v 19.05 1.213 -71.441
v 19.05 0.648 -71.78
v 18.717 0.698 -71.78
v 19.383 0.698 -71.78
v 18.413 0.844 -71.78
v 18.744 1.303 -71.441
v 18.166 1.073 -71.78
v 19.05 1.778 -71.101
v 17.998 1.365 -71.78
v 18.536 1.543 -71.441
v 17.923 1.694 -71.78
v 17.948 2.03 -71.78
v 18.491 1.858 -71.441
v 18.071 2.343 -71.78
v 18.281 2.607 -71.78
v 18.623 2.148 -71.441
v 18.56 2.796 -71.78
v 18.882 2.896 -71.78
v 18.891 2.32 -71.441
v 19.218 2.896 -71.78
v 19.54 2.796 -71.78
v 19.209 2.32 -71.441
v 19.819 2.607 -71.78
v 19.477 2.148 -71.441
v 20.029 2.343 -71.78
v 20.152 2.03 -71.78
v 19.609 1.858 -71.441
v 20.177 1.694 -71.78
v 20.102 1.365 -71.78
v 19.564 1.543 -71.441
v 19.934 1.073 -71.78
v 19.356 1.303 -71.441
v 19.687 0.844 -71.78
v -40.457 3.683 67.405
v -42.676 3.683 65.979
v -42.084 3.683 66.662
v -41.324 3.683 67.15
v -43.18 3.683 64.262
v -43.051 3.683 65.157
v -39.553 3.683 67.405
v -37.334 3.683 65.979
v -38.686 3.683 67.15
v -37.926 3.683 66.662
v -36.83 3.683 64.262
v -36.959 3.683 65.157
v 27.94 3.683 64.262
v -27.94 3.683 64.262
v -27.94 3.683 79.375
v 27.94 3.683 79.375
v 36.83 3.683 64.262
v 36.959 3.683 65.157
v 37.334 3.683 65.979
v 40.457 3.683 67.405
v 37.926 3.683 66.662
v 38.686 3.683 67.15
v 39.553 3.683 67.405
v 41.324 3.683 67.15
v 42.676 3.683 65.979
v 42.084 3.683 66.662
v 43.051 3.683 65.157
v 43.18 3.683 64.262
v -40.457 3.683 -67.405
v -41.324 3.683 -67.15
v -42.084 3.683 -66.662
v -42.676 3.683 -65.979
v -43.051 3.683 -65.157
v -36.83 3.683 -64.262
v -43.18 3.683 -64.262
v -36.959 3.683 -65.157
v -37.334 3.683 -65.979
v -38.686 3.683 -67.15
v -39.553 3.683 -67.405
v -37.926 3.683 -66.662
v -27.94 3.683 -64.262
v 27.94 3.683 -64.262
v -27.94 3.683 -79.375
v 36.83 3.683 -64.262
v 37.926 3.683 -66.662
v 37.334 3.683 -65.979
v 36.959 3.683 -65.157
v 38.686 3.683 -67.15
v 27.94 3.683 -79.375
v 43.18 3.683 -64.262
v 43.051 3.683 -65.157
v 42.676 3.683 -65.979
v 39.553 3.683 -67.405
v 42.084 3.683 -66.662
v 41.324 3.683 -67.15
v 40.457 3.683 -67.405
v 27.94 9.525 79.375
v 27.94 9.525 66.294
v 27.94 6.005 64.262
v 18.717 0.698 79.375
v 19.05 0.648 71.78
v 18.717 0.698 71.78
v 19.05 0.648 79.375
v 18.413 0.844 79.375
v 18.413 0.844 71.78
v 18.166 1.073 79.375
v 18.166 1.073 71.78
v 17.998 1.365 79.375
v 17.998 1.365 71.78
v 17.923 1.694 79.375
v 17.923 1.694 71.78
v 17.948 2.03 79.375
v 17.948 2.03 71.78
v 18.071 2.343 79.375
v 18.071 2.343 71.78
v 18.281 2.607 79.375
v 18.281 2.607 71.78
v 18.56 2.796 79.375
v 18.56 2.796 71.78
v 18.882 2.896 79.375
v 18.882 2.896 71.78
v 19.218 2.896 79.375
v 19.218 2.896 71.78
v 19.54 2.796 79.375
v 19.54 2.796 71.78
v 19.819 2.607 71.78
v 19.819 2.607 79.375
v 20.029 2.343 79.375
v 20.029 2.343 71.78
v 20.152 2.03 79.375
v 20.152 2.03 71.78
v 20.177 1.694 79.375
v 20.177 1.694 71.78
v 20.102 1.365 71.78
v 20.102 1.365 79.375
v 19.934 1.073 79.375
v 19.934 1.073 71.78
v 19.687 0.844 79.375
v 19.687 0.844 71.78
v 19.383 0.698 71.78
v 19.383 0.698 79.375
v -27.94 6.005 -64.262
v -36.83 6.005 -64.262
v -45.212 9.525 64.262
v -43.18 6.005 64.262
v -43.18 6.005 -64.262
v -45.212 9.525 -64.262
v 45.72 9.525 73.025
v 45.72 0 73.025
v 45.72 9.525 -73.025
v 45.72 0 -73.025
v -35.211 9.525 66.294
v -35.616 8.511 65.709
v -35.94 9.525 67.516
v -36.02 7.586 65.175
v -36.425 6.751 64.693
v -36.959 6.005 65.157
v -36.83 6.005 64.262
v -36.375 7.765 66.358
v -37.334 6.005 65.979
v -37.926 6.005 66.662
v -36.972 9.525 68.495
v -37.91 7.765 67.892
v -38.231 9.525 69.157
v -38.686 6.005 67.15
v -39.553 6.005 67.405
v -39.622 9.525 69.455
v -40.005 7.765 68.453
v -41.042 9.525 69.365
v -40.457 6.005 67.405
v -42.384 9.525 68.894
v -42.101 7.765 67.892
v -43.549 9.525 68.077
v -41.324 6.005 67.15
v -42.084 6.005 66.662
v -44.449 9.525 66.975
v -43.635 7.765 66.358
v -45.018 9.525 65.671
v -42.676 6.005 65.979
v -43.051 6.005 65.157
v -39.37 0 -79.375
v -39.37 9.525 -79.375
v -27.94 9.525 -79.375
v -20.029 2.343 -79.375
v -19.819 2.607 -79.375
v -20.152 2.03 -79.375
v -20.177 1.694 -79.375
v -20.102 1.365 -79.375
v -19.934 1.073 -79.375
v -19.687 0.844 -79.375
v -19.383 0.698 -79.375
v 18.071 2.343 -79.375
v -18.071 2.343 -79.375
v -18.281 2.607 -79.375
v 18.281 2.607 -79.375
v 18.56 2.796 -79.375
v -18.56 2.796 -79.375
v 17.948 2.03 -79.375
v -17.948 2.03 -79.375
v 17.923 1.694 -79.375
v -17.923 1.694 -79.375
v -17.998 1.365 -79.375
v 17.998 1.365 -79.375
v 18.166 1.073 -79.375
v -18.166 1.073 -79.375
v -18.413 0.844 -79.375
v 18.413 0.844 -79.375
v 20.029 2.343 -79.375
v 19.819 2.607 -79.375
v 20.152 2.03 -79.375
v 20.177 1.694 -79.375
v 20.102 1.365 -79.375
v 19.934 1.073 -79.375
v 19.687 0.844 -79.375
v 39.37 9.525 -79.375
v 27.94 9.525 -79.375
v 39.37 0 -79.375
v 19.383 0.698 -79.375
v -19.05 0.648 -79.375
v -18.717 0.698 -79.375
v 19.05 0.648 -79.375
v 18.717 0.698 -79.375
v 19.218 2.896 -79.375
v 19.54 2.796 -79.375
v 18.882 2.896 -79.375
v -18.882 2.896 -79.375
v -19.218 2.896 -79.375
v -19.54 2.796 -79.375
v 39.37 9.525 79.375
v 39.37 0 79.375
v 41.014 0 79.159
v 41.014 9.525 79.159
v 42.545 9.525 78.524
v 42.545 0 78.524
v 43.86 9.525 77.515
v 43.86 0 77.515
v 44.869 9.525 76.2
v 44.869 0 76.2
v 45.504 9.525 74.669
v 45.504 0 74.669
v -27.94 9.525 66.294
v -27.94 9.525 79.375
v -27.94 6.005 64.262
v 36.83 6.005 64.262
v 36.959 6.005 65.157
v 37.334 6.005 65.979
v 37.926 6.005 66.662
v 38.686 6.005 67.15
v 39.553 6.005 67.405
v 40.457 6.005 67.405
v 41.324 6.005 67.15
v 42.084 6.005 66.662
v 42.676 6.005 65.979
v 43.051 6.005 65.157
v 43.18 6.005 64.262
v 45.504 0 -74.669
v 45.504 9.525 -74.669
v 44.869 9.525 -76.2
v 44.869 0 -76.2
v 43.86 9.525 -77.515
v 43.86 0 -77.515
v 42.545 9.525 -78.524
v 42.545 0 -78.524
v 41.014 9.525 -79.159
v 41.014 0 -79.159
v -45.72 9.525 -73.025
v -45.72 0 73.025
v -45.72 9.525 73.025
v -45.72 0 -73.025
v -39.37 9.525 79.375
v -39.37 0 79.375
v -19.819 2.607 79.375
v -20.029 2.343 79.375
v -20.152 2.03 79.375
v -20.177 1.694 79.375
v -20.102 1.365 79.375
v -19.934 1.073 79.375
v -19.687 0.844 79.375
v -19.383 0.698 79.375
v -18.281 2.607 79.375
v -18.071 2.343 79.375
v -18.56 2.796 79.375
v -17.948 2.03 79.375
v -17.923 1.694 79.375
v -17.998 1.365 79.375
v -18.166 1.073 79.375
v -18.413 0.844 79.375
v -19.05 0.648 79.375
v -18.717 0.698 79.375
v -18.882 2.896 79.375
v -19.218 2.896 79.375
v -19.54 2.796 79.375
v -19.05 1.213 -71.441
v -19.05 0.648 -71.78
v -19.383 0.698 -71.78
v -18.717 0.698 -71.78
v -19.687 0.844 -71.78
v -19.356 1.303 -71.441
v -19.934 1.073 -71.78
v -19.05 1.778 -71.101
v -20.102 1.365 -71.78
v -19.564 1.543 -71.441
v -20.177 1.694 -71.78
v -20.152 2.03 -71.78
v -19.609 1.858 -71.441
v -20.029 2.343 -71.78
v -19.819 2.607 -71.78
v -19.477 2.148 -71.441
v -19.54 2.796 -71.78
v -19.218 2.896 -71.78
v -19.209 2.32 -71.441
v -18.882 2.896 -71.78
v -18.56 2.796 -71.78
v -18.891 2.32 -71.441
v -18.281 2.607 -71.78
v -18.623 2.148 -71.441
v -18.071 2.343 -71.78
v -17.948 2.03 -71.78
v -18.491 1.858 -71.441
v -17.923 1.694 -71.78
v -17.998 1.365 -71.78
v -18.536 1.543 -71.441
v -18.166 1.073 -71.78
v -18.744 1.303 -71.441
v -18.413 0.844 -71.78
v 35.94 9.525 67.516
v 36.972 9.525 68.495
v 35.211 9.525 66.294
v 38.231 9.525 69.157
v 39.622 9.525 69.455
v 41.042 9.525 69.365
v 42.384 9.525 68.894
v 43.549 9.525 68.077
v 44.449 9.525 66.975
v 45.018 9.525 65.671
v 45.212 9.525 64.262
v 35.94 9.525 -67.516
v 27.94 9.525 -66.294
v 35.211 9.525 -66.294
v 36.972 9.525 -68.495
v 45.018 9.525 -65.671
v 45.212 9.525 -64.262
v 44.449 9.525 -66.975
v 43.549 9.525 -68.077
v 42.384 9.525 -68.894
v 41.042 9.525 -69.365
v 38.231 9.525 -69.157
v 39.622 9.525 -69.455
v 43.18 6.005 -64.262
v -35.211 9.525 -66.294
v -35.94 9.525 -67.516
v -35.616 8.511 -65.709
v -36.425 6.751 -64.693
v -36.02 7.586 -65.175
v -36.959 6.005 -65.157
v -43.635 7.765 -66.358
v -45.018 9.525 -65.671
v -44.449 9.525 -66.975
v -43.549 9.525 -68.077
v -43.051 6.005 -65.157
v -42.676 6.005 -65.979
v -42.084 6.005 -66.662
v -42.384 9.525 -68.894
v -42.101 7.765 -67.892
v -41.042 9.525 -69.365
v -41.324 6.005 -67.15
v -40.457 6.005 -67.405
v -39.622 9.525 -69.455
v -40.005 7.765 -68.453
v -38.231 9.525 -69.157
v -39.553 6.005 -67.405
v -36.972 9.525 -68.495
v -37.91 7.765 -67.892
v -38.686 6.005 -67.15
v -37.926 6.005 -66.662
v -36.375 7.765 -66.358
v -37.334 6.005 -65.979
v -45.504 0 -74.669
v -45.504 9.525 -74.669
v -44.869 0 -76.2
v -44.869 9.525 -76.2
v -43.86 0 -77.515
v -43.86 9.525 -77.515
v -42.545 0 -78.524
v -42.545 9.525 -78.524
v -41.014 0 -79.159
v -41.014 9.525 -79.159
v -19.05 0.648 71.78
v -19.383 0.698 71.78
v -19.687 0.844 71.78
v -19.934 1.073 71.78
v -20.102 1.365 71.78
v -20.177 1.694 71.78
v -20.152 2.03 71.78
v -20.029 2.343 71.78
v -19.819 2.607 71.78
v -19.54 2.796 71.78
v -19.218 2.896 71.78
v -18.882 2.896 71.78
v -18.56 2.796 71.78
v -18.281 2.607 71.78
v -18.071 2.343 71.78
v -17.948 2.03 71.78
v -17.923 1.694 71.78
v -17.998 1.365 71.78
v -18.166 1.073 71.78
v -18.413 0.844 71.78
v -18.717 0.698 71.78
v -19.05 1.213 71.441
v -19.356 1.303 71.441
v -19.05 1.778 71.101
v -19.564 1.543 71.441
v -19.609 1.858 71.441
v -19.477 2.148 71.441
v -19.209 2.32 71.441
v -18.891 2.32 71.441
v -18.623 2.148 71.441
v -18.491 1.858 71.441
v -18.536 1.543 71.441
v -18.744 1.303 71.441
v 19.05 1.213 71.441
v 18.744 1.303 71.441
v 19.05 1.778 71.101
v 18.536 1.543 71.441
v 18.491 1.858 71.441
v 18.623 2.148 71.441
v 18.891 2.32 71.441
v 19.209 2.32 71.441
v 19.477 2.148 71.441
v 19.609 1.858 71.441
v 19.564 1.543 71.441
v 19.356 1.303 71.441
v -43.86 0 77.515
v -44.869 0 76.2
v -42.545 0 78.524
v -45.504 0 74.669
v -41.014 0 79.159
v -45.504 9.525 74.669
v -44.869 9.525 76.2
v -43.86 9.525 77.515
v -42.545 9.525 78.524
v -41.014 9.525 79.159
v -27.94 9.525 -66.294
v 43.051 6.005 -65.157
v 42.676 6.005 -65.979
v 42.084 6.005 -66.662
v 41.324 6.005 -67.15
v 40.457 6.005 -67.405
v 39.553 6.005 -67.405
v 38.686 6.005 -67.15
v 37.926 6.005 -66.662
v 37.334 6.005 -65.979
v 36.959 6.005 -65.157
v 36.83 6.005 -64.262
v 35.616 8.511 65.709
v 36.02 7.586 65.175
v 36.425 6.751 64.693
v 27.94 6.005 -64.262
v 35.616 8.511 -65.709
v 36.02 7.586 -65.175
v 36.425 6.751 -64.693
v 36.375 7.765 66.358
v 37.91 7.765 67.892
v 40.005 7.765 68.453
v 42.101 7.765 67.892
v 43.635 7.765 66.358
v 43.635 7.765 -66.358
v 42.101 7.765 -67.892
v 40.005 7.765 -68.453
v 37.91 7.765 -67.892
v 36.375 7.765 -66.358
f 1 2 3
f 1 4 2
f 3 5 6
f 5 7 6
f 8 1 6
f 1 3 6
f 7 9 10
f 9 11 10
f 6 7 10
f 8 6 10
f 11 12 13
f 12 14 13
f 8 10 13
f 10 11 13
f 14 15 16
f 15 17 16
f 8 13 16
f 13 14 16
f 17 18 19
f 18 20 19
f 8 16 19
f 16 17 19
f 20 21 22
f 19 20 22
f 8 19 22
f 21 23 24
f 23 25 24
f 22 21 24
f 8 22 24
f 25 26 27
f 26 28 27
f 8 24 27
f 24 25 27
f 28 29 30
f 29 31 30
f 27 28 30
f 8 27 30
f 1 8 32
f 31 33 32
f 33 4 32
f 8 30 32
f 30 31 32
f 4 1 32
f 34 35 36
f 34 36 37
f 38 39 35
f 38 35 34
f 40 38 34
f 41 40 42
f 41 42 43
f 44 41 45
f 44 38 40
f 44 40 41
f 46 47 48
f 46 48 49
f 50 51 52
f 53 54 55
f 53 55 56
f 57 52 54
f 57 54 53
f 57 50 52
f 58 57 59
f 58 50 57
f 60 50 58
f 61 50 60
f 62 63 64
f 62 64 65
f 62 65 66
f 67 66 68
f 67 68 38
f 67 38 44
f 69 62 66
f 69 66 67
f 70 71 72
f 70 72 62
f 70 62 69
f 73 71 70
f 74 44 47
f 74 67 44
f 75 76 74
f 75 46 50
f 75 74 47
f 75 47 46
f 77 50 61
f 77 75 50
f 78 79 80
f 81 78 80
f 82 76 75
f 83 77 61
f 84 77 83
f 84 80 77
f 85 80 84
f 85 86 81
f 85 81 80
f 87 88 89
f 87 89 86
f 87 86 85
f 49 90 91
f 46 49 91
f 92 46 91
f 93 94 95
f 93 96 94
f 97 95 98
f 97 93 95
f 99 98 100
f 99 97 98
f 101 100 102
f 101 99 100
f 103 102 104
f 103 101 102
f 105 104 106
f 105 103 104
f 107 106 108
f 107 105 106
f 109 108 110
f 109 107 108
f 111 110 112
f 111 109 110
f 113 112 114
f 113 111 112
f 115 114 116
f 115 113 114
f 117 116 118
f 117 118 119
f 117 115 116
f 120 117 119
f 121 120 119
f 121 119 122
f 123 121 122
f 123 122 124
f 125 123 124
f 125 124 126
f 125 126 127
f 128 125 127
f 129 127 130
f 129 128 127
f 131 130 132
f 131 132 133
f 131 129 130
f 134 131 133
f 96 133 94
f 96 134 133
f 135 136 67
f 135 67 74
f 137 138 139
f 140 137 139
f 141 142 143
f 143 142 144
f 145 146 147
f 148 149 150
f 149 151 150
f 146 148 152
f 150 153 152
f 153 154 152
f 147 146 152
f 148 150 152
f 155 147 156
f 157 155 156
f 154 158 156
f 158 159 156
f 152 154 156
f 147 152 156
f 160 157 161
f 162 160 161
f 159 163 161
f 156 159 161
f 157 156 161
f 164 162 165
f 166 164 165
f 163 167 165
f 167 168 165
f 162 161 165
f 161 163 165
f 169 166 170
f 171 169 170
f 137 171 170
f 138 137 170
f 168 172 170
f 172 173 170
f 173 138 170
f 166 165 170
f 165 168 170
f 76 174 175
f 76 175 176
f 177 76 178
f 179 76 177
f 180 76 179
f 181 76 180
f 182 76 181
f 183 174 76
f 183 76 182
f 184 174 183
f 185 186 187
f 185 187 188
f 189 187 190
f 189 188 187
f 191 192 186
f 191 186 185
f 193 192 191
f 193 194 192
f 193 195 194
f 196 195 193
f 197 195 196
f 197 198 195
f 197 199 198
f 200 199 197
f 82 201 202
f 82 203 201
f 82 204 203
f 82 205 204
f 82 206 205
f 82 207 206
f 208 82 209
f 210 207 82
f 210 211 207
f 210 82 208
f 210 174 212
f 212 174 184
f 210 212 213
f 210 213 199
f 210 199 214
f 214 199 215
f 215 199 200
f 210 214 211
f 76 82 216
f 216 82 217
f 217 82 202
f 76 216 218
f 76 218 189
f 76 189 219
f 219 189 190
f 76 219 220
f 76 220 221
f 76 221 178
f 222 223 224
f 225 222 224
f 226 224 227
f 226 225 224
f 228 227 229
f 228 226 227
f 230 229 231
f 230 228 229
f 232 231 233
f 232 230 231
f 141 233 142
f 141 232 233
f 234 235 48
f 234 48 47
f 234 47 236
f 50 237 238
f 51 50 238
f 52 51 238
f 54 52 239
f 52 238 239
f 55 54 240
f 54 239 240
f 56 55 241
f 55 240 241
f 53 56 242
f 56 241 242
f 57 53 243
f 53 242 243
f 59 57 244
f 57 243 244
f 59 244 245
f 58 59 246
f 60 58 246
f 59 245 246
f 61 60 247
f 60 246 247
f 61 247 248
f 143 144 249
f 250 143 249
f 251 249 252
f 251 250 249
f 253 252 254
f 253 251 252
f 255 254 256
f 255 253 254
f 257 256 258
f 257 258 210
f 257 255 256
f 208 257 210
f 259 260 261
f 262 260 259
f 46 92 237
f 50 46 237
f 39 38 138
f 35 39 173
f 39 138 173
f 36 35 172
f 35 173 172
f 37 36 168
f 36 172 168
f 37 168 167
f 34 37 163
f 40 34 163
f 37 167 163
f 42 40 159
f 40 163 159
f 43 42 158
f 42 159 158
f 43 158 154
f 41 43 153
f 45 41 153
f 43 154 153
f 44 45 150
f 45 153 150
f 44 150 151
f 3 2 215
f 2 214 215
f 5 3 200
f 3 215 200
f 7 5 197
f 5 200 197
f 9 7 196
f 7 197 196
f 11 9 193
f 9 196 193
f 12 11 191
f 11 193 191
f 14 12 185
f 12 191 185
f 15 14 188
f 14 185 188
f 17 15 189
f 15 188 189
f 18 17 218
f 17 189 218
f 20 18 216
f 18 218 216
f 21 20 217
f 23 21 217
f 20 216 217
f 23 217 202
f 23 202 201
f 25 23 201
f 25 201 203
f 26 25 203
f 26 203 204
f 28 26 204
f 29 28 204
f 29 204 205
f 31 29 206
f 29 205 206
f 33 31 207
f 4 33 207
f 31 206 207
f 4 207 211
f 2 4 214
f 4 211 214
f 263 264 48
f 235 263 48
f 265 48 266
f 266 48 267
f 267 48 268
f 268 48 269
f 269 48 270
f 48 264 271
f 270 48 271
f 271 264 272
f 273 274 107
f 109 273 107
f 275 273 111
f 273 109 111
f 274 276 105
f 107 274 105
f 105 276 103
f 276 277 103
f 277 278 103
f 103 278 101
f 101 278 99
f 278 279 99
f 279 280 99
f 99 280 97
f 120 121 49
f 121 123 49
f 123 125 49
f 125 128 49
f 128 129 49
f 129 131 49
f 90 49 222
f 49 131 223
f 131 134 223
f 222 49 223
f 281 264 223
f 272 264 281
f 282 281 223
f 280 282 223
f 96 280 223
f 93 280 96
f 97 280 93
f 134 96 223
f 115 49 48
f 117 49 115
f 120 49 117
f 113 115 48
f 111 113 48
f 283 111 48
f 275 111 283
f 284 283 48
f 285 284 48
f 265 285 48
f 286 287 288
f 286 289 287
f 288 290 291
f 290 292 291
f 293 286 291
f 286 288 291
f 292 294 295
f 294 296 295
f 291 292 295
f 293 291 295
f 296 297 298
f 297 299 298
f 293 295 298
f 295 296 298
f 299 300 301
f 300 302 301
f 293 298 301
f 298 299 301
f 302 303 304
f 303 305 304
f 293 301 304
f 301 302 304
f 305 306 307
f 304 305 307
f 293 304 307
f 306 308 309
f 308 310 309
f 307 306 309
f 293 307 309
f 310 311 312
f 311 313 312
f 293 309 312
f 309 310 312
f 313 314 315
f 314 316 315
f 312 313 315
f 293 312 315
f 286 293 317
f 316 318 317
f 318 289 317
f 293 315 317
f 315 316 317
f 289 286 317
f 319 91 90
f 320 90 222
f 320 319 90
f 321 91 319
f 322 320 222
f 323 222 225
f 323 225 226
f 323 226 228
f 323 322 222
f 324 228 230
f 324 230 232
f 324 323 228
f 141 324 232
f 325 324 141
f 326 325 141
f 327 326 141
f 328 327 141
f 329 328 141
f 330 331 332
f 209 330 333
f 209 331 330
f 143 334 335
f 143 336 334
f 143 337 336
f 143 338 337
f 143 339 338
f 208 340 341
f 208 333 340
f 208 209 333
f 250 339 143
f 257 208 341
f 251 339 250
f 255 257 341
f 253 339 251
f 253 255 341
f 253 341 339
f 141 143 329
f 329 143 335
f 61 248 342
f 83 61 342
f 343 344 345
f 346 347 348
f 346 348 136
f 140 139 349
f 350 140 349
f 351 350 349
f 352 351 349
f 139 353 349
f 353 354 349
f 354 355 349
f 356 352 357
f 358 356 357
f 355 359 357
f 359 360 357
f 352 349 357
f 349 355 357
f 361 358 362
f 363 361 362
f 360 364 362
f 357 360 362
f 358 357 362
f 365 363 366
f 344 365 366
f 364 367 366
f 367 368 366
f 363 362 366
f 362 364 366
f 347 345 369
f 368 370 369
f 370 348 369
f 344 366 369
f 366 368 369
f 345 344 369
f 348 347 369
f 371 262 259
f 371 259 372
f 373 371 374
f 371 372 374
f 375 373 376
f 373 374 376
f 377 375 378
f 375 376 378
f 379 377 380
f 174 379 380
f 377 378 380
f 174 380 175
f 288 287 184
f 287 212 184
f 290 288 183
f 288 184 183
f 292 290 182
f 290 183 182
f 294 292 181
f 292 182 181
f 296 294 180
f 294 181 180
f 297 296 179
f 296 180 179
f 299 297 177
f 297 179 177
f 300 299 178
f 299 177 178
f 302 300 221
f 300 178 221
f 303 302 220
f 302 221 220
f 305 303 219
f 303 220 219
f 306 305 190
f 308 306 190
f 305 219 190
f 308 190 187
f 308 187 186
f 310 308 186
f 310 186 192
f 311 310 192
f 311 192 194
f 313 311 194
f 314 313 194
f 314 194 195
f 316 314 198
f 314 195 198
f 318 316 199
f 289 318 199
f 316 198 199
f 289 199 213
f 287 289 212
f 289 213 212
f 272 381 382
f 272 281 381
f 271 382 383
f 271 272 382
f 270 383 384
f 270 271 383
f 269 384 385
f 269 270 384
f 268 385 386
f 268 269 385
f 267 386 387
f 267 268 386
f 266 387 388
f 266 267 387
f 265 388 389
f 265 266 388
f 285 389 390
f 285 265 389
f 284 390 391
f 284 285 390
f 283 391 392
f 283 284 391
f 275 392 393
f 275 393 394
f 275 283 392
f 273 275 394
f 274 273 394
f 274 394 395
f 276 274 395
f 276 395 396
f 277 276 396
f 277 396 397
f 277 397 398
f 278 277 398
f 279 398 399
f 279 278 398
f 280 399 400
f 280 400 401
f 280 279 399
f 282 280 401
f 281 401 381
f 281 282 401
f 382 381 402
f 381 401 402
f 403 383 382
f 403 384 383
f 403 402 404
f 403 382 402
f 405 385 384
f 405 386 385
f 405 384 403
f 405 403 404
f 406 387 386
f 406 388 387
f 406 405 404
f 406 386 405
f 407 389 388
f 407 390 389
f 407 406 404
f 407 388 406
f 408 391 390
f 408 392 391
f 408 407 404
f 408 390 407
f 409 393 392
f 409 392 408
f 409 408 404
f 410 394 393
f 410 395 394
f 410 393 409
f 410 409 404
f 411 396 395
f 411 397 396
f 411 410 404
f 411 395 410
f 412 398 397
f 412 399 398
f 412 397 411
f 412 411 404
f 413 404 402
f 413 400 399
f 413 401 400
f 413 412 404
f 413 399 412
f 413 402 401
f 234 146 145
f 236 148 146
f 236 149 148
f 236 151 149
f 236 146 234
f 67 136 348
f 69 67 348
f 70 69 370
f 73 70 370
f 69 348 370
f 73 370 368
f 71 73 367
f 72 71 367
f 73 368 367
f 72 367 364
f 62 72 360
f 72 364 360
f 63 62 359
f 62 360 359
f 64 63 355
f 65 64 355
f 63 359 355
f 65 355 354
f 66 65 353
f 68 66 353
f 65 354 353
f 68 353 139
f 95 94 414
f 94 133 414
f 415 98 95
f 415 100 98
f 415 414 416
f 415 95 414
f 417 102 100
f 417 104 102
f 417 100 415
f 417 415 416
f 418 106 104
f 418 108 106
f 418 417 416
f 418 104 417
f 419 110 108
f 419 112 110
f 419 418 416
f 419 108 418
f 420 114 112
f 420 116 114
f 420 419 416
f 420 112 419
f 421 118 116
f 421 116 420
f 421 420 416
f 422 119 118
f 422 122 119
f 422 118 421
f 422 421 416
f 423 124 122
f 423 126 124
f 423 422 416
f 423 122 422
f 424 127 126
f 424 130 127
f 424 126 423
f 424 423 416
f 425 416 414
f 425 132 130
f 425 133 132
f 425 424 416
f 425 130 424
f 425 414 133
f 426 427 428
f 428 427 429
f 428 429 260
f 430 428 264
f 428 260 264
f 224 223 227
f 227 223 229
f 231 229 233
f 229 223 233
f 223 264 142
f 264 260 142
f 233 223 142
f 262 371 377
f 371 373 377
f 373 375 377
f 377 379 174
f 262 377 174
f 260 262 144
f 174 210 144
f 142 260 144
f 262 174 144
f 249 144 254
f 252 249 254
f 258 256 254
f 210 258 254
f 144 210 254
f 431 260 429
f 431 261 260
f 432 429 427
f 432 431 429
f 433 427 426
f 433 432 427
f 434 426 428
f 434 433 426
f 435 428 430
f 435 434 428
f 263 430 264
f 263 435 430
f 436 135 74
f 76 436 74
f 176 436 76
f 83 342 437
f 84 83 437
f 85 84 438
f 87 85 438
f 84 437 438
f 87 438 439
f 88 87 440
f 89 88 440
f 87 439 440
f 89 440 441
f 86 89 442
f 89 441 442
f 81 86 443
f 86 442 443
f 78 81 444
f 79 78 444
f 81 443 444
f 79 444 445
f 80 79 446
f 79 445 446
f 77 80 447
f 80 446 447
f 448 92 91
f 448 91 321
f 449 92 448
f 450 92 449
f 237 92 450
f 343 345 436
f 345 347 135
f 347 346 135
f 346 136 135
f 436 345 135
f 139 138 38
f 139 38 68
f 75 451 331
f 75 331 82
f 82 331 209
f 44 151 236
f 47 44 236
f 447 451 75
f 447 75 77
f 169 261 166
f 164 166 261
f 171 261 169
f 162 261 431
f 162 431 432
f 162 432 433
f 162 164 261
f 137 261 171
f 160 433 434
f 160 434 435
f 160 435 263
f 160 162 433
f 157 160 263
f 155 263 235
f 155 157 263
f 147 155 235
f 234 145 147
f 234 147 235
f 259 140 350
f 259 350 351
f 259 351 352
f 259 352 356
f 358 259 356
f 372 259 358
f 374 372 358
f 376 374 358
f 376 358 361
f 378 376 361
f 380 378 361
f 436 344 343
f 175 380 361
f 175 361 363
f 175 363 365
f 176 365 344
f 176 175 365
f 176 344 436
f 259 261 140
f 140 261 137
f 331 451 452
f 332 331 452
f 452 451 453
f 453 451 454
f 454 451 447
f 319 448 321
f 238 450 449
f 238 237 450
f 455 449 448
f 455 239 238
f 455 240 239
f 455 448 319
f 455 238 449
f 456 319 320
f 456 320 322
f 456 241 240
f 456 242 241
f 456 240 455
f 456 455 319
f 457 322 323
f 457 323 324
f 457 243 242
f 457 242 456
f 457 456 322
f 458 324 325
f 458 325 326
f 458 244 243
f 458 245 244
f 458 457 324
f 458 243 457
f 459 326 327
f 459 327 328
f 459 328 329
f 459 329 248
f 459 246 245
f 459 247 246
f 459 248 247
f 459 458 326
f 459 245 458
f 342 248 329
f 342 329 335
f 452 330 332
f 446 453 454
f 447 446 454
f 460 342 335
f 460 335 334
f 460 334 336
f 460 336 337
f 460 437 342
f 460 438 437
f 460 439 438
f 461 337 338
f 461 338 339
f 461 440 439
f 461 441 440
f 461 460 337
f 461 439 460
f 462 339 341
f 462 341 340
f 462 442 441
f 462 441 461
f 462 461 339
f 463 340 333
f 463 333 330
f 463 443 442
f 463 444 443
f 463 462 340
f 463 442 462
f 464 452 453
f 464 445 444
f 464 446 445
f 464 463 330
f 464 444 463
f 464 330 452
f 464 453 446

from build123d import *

# Parameters (mm, degrees)
SKETCH1_W                      = 91.44
SKETCH1_H                      = 158.75
BOSS_EXTRUDE1_DEPTH            = 9.525
FILLET1_R                      = 6.35
SKETCH2_W                      = 86.36
SKETCH2_H                      = 128.524
CUT_EXTRUDE1_DEPTH             = 5.842
F_4_40_TAPPED_HOLE1_AT_2_COUNT = 2
F_4_40_TAPPED_HOLE1_AT_2_PITCH = 38.1
SKETCH7_R                      = 3.175
CUT_EXTRUDE2_DEPTH             = 5.842
CHAMFER1_SIZE                  = 2.032
CHAMFER1_SIZE2                 = 3.519527241
CUT_EXTRUDE3_REACH             = 94.095
SKETCH8_W                      = 55.88
SKETCH8_H                      = 158.75


with BuildPart() as part:
    # Sketch1 → Boss-Extrude1 (new body)
    with BuildSketch(Plane(origin=(0, 0, 0), x_dir=(1, 0, 0), z_dir=(0, 1, 0))):
        Rectangle(SKETCH1_W, SKETCH1_H)
    extrude(amount=BOSS_EXTRUDE1_DEPTH)

    # Fillet1
    fillet1_edges = [part.edges().sort_by_distance(p)[0] for p in [
        (45.72, 4.7625, 79.375),
        (-45.72, 4.7625, 79.375),
        (-45.72, 4.7625, -79.375),
        (45.72, 4.7625, -79.375),
    ]]
    fillet(fillet1_edges, radius=FILLET1_R)

    # Sketch2 → Cut-Extrude1 (cut)
    with BuildSketch(Plane(origin=(0, 9.525, 0), x_dir=(1, 0, 0), z_dir=(0, 1, 0))):
        Rectangle(SKETCH2_W, SKETCH2_H)
    extrude(amount=-CUT_EXTRUDE1_DEPTH, mode=Mode.SUBTRACT)

    # Sketch5 → #4-40 Tapped Hole1 (revolve, cut)
    with BuildSketch(Plane(origin=(-19.05, 1.778, 79.375), x_dir=(0, -1, 0), z_dir=(1, 0, 0))):
        Polygon((0, 0), (0, 8.273752758), (1.1303, 7.5946), (1.1303, 0), align=None)
    f_4_40_tapped_hole1 = revolve(axis=Axis((-19.05, 1.778, 85.725), (0, 0, -1)), mode=Mode.SUBTRACT)

    # #4-40 Tapped Hole1 at 2: #4-40 Tapped Hole1 ×2
    with Locations(*[(i * F_4_40_TAPPED_HOLE1_AT_2_PITCH, 0, 0) for i in range(1, F_4_40_TAPPED_HOLE1_AT_2_COUNT)]):
        add(f_4_40_tapped_hole1, mode=Mode.SUBTRACT)

    # Sketch7 → Cut-Extrude2 (cut)
    with BuildSketch(Plane(origin=(0, 9.525, 0), x_dir=(1, 0, 0), z_dir=(0, 1, 0))):
        with Locations((-40.005, 64.262)):
            Circle(SKETCH7_R)
        with Locations((40.005, 64.262)):
            Circle(SKETCH7_R)
        with Locations((-40.005, -64.262)):
            Circle(SKETCH7_R)
        with Locations((40.005, -64.262)):
            Circle(SKETCH7_R)
    extrude(amount=-CUT_EXTRUDE2_DEPTH, mode=Mode.SUBTRACT)

    # Mirror1: #4-40 Tapped Hole1 across plane
    add(f_4_40_tapped_hole1.mirror(Plane.XY), mode=Mode.SUBTRACT)

    # Mirror1 copy 1 sketch → Mirror1 copy 1 (revolve, cut)
    with BuildSketch(Plane(origin=(19.05, 1.778, -79.375), x_dir=(0, -1, 0), z_dir=(1, 0, 0))):
        Polygon((0, 0), (0, -8.273752758), (1.1303, -7.5946), (1.1303, 0), align=None)
    revolve(axis=Axis((19.05, 1.778, -85.725), (0, 0, -1)), mode=Mode.SUBTRACT)

    # Chamfer1
    chamfer1_edges = [part.edges().sort_by_distance(p)[0] for p in [
        (43.18, 9.525, 0),
        (-43.18, 9.525, 0),
        (0, 9.525, -64.262),
        (0, 9.525, 64.262),
        (40.005, 9.525, -67.437),
        (-40.005, 9.525, 67.437),
        (40.005, 9.525, 67.437),
        (-40.005, 9.525, -67.437),
    ]]
    chamfer1_side = [part.faces().sort_by_distance(p)[0] for p in [
        (0, 9.525, -77.542983731),
    ]]
    chamfer(chamfer1_edges, length=CHAMFER1_SIZE, length2=CHAMFER1_SIZE2, reference=chamfer1_side[0])

    # Cut-Extrude3: up to this face of the body (flat: up to its plane)
    cut_extrude3_end = Plane(part.part.faces().sort_by_distance((0, 3.683, 0))[0])
    # Sketch8 → Cut-Extrude3 (cut, up to the picked face)
    with BuildSketch(Plane(origin=(0, 9.525, 0), x_dir=(1, 0, 0), z_dir=(0, 1, 0)), mode=Mode.PRIVATE) as cut_extrude3_sk1:
        Rectangle(SKETCH8_W, SKETCH8_H)
    cut_extrude3_tool1 = split(extrude(cut_extrude3_sk1.sketch, amount=-CUT_EXTRUDE3_REACH, mode=Mode.PRIVATE), bisect_by=cut_extrude3_end, keep=Keep.BOTH, mode=Mode.PRIVATE)
    add(cut_extrude3_tool1.solids().sort_by(Axis((0, 9.525, 0), (0, -1, 0)))[0], mode=Mode.SUBTRACT)


solid = part.part
